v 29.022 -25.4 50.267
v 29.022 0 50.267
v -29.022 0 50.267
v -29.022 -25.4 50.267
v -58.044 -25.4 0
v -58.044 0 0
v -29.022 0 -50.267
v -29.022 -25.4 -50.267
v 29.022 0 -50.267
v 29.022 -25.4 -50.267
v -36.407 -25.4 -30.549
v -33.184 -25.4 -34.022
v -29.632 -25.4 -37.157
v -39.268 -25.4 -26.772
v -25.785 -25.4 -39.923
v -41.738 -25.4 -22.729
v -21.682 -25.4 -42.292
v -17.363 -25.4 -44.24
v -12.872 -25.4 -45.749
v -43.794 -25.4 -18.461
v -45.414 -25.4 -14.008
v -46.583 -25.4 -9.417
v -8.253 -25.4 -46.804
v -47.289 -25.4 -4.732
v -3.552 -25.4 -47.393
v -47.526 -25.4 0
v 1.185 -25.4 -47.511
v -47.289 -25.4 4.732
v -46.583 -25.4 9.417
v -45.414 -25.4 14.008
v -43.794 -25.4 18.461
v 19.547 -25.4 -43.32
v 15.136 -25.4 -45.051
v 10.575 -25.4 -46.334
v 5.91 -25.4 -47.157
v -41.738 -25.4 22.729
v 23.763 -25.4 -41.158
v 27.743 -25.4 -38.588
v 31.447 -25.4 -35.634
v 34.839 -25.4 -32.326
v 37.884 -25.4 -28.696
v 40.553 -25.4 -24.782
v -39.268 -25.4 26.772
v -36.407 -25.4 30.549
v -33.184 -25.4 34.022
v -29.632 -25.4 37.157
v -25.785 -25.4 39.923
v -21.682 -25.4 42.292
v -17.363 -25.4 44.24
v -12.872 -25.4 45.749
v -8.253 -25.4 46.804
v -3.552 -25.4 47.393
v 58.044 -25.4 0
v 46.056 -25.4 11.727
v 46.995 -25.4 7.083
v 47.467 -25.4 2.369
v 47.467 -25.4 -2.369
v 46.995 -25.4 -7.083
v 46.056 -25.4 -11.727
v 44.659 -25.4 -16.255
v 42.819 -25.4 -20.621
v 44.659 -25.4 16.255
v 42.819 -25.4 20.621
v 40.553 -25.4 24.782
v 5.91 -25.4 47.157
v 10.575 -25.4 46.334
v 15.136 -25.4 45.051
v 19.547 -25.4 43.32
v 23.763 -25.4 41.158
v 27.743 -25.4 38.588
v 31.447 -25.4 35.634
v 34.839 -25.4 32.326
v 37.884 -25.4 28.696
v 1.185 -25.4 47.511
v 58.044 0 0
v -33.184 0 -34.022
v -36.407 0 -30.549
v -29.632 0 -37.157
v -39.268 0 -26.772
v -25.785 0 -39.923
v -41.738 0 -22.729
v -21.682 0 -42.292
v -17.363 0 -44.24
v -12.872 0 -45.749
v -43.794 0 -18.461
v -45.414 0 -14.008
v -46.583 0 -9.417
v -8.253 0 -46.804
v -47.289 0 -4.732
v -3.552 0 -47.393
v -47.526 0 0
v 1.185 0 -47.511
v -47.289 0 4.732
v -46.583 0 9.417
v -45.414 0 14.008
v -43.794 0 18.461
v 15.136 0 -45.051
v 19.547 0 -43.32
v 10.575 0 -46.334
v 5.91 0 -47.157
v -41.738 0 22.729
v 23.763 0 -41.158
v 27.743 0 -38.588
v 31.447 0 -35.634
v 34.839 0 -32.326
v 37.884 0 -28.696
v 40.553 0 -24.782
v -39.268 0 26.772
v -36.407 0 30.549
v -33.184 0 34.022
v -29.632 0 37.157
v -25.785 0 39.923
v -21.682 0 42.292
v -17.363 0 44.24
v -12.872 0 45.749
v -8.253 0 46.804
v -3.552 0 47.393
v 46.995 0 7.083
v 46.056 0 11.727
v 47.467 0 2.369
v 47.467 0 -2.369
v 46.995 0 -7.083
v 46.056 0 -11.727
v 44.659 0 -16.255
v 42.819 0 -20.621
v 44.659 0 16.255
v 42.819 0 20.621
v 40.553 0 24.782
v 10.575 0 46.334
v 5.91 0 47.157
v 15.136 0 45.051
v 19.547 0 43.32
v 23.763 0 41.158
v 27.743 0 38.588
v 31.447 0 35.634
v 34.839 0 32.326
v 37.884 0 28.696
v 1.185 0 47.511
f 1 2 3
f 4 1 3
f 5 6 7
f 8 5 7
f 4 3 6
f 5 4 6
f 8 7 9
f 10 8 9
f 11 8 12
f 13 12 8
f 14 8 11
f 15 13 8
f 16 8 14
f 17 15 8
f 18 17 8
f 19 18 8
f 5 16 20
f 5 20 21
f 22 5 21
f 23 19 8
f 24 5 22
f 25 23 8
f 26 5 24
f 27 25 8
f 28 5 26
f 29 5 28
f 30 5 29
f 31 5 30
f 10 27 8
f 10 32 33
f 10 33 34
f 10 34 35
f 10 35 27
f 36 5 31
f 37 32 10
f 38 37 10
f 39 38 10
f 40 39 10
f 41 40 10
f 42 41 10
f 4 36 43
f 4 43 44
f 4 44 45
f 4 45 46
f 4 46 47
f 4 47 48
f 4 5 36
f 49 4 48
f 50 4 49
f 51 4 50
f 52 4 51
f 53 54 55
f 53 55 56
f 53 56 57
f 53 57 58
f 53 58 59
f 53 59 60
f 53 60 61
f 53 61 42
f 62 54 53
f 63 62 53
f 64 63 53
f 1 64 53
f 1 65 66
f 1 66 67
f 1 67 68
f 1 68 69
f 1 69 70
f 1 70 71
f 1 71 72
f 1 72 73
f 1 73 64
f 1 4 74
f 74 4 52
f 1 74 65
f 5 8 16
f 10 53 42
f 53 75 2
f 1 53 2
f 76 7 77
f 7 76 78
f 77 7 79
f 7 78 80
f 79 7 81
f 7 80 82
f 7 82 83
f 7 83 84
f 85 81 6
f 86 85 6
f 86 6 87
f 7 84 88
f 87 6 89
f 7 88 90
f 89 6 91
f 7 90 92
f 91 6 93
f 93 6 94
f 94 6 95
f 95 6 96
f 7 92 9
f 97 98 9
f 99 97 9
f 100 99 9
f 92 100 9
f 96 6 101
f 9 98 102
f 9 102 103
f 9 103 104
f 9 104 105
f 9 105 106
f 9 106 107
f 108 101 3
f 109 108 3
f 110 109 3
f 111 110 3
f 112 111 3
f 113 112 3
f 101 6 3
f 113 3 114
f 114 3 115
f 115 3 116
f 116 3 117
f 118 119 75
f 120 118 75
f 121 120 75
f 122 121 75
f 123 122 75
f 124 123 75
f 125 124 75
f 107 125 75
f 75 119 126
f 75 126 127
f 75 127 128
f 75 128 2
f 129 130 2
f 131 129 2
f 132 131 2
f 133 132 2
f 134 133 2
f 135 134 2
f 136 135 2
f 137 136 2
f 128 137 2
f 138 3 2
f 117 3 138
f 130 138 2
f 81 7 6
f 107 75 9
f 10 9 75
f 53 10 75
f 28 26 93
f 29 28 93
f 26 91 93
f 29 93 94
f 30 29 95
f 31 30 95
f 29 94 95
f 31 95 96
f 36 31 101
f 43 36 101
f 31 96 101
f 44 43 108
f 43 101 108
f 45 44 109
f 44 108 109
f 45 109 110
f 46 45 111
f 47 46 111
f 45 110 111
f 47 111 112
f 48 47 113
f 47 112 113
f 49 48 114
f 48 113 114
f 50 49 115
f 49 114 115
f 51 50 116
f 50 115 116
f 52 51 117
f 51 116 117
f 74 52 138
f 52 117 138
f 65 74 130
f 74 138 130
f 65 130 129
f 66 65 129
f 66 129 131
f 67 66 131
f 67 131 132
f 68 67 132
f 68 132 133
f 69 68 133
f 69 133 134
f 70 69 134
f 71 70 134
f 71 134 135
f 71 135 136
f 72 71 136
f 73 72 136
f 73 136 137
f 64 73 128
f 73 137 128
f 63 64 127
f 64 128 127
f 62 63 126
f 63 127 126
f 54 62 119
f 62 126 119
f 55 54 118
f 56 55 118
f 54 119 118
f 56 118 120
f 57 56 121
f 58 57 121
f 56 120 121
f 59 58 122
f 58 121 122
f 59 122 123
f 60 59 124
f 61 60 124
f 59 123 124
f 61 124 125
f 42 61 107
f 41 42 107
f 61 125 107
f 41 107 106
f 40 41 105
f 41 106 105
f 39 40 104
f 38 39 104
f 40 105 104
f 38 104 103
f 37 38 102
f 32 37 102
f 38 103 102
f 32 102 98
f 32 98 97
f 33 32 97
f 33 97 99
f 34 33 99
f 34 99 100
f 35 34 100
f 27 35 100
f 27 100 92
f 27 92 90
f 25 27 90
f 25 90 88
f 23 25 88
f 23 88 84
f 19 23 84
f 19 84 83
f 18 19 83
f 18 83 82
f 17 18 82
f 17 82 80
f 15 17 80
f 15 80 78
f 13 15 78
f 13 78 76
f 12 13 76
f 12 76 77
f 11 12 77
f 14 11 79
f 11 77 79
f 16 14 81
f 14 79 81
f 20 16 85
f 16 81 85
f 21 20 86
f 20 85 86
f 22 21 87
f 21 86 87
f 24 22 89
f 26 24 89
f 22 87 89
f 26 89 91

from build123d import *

# Parameters (mm, degrees)
F1_DEPTH = 25.4
F2_R     = 48.434429
F3_DEPTH = 1.18585
F4_R     = 47.525627
F5_DEPTH = 63.5


with BuildPart() as f1:
    # F0 (on Front) → F1 (new body)
    with BuildSketch(Plane.XZ):
        Polygon((29.021849, 50.267316), (-29.021849, 50.267316), (-58.043697, 0), (-29.021849, -50.267316), (29.021849, -50.267316), (58.043697, 0), align=None)
    extrude(amount=F1_DEPTH)

    # F2 (on face) → F3 (join)
    with BuildSketch(Plane(origin=(0, 0, 0), x_dir=(-1, 0, 0), z_dir=(0, 1, 0))):
        Circle(F2_R)
    extrude(amount=-F3_DEPTH)

    # F4 (on face) → F5 (cut, symmetric)
    with BuildSketch(Plane(origin=(0, 0, 0), x_dir=(-1, 0, 0), z_dir=(0, 1, 0))):
        Circle(F4_R)
    extrude(amount=F5_DEPTH, both=True, mode=Mode.SUBTRACT)


solid = f1.part
